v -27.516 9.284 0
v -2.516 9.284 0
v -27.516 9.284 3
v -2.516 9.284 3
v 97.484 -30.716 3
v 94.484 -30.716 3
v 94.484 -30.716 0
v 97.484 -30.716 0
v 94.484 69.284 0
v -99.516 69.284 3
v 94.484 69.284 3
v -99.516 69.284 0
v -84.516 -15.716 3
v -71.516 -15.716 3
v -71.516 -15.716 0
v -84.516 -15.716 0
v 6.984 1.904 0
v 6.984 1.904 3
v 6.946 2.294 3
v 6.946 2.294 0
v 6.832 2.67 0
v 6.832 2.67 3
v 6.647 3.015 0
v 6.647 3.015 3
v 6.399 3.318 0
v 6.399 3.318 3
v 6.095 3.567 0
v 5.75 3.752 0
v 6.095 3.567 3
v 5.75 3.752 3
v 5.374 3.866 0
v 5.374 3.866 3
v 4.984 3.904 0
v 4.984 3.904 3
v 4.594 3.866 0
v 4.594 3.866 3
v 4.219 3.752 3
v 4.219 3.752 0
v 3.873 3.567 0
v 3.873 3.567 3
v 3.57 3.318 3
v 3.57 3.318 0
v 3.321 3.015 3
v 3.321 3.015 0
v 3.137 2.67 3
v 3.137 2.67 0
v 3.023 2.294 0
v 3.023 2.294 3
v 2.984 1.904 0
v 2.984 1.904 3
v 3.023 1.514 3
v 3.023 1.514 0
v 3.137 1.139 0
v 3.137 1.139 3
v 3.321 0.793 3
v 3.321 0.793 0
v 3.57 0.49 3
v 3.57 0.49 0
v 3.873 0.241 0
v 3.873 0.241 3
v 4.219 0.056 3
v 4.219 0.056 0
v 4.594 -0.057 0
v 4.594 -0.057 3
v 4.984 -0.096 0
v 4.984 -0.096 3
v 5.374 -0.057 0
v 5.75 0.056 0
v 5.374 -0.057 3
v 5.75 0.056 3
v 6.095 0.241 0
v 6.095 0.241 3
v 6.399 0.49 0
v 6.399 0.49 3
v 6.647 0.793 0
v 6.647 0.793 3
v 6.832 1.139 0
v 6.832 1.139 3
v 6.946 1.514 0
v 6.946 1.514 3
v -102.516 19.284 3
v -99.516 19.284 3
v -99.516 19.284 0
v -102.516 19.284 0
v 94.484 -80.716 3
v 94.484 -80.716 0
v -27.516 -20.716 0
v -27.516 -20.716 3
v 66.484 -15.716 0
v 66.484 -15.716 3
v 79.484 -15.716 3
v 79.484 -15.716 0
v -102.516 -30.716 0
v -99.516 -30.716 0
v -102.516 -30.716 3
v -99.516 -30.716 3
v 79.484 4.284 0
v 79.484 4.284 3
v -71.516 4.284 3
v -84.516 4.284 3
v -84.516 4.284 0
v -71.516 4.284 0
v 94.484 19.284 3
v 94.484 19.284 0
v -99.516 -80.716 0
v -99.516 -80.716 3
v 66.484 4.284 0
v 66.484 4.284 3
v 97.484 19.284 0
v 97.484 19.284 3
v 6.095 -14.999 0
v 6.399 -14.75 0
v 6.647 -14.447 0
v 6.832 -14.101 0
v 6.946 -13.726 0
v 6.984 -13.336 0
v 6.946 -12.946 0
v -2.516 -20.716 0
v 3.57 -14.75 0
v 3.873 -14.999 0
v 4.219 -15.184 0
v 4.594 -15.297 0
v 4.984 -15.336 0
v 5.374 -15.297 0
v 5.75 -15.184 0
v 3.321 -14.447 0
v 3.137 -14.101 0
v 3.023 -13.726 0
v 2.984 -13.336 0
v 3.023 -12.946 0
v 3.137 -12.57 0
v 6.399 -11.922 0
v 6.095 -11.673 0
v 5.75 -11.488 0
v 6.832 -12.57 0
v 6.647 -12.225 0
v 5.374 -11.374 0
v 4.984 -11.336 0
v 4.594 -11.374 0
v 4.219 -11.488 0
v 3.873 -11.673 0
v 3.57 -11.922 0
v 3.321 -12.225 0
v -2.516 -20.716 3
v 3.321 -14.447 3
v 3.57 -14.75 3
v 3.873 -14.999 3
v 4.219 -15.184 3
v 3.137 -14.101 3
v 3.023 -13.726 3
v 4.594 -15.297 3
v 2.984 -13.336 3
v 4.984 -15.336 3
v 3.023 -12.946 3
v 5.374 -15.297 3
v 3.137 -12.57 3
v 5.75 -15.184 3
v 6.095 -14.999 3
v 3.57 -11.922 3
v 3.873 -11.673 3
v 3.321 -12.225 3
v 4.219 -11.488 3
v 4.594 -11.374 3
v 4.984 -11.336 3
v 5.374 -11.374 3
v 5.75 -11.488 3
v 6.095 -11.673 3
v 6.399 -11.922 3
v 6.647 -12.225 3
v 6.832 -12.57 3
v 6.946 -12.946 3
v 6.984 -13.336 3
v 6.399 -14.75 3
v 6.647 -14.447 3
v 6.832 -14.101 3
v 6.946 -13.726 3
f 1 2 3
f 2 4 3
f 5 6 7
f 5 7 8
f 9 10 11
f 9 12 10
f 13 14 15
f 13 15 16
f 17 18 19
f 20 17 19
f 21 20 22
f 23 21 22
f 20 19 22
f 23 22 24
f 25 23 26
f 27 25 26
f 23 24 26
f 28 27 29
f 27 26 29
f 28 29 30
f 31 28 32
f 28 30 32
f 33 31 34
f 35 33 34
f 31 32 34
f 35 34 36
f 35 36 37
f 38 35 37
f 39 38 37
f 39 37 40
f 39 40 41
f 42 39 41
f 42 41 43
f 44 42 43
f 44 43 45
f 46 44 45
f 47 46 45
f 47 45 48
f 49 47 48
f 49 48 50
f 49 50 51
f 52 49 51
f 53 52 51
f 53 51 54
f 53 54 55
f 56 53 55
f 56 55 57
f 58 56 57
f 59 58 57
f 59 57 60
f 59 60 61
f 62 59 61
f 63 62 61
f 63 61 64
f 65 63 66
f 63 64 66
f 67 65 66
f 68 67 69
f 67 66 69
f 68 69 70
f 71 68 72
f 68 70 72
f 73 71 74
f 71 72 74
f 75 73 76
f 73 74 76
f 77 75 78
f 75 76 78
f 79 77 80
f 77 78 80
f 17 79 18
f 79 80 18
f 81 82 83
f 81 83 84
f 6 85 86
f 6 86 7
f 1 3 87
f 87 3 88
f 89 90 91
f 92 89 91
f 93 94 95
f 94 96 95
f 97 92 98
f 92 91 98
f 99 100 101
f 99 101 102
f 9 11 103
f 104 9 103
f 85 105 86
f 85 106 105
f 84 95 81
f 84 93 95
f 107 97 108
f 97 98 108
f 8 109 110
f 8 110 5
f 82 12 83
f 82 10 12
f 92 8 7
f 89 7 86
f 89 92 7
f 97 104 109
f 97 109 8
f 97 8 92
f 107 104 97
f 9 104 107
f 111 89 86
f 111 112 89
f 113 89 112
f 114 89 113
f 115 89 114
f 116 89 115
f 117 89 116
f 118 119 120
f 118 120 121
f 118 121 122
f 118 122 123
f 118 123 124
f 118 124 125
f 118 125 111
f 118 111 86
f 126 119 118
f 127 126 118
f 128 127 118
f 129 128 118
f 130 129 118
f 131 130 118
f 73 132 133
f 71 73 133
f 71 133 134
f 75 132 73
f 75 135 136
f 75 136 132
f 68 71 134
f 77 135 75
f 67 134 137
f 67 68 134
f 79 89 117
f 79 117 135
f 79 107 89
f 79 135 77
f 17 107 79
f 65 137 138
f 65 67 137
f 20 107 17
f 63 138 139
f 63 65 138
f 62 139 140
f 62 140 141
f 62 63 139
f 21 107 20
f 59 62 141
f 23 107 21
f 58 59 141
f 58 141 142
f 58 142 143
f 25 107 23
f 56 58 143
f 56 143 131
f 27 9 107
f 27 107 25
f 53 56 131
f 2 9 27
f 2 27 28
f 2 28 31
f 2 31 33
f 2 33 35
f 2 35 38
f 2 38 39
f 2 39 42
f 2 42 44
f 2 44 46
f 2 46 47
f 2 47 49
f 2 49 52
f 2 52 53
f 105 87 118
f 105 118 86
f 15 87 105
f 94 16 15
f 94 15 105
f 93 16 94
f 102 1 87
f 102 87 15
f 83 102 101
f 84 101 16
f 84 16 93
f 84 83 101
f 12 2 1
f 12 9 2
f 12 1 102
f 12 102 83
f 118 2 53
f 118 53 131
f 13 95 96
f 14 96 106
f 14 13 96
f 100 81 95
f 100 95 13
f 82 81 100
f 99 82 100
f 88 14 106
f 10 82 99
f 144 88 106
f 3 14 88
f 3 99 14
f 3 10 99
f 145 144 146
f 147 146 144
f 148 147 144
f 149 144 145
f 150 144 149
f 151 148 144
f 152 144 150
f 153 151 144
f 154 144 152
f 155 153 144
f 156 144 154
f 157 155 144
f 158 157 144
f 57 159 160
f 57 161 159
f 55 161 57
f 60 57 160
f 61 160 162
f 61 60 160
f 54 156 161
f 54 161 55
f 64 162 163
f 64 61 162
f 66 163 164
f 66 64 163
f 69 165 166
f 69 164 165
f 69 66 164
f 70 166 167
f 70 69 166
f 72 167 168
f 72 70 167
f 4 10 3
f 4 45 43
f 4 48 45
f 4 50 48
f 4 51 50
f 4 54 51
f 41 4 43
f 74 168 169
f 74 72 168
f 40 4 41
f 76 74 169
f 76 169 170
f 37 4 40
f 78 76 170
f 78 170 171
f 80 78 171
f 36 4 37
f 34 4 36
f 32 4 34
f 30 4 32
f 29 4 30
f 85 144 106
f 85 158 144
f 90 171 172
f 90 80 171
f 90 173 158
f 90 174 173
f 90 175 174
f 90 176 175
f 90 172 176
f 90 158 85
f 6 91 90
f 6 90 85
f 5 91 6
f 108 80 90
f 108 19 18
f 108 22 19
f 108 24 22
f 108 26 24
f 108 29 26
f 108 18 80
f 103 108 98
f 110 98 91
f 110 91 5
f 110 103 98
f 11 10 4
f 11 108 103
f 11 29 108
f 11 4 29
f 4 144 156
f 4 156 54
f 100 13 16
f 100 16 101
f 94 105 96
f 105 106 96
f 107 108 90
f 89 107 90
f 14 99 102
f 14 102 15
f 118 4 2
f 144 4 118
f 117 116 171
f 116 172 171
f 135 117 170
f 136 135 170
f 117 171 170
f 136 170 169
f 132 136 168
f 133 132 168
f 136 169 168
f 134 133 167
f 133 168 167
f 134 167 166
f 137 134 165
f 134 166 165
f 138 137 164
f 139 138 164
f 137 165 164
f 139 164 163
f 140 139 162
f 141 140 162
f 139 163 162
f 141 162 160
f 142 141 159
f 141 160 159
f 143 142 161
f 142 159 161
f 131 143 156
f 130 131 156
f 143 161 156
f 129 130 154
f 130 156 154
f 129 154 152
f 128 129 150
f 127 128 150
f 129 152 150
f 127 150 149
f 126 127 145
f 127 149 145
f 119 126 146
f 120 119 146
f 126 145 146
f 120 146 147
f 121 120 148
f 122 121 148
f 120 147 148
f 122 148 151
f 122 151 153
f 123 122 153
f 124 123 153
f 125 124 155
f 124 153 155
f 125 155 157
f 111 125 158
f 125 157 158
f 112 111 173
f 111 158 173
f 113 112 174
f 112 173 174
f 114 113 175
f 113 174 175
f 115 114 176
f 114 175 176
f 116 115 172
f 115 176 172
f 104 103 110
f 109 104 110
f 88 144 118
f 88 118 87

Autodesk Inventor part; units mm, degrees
ref_plane "YZ Plane" through (0, 0, 0) normal (1, 0, 0) x (0, 1, 0)
ref_plane "XZ Plane" through (0, 0, 0) normal (0, 1, 0) x (-1, 0, 0)
ref_plane "XY Plane" through (0, 0, 0) normal (0, 0, 1) x (1, 0, 0)
sketch "Sketch1" plane through (0, 0, 0) normal (0, 0, 1) x (1, 0, 0)
  line L0 (-102.5157, 69.2842) -> (97.4843, 69.2842)
  line L1 (97.4843, 69.2842) -> (97.4843, -80.7158)
  line L2 (97.4843, -80.7158) -> (-102.5157, -80.7158)
  line L3 (-102.5157, -80.7158) -> (-102.5157, 69.2842)
  point P0 (0, 0)
extrude "Extrusion1" add sketch "Sketch1" along normal blind 3
sketch "Sketch3" plane through (0, 0, 3) normal (0, 0, 1) x (1, 0, 0)
  point P0 (0, 0)
sketch "Sketch4" plane through (0, 0, 3) normal (0, 0, 1) x (1, 0, 0)
  line L0 (97.4843, 69.2842) -> (-102.5157, 69.2842) projected
  line L1 (-102.5157, 69.2842) -> (-99.5157, 69.2842)
  line L2 (-99.5157, 69.2842) -> (-99.5157, 19.2842)
  line L3 (-99.5157, 19.2842) -> (-102.5157, 19.2842)
  line L4 (-102.5157, 19.2842) -> (-102.5157, 69.2842)
  point P0 (0, 0)
extrude "Extrusion2" cut sketch "Sketch4" against normal blind 3
sketch "Sketch5" plane through (0, 0, 3) normal (0, 0, 1) x (1, 0, 0)
  line L0 (97.4843, -80.7158) -> (94.4843, -80.7158)
  line L1 (94.4843, -80.7158) -> (94.4843, -30.7158)
  line L2 (94.4843, -30.7158) -> (97.4843, -30.7158)
  line L3 (97.4843, -30.7158) -> (97.4843, -80.7158)
  point P0 (0, 0)
  point P1 (-102.5157, -80.7158)
  dimension "d17" = 3
  dimension "d18" = 50
extrude "Extrusion3" cut sketch "Sketch5" against normal blind 3
sketch "Sketch6" plane through (0, 0, 3) normal (0, 0, 1) x (1, 0, 0)
  line L0 (97.4843, -30.7158) -> (97.4843, 69.2842) projected
  line L1 (97.4843, 69.2842) -> (94.4843, 69.2842)
  line L2 (94.4843, 69.2842) -> (94.4843, 19.2842)
  line L3 (94.4843, 19.2842) -> (97.4843, 19.2842)
  line L4 (97.4843, 19.2842) -> (97.4843, 69.2842)
  point P0 (0, 0)
  dimension "d21" = 50
  dimension "d22" = 3
extrude "Extrusion4" cut sketch "Sketch6" against normal blind 3
sketch "Sketch7" plane through (0, 0, 3) normal (0, 0, 1) x (1, 0, 0)
  line L0 (-102.5157, 19.2842) -> (-102.5157, -80.7158) projected
  line L1 (-102.5157, -80.7158) -> (-99.5157, -80.7158)
  line L2 (-99.5157, -80.7158) -> (-99.5157, -30.7158)
  line L3 (-99.5157, -30.7158) -> (-102.5157, -30.7158)
  line L4 (-102.5157, -30.7158) -> (-102.5157, -80.7158)
  point P0 (0, 0)
  dimension "d25" = 50
  dimension "d26" = 3
extrude "Extrusion5" cut sketch "Sketch7" against normal blind 3
sketch "Sketch8" plane through (0, 0, 3) normal (0, 0, 1) x (1, 0, 0)
  line L0 (-102.5157, -30.7158) -> (-102.5157, 19.2842) projected
  line L1 (97.4843, -30.7158) -> (94.4843, -30.7158) projected
  line L2 (94.4843, -80.7158) -> (-99.5157, -80.7158) projected
  line L3 (-10.0157, -50.7158) -> (4.9843, -50.7158)
  line L4 (4.9843, -50.7158) -> (4.9843, -80.7158)
  line L5 (4.9843, -80.7158) -> (-10.0157, -80.7158)
  line L6 (-10.0157, -80.7158) -> (-10.0157, -50.7158)
  point P0 (0, 0)
  dimension "d32" = 15
  dimension "d33" = 30
extrude "Extrusion6" cut sketch "Sketch8" against normal blind 3
sketch "Sketch9" plane through (-10.0157, -80.7158, 3) normal (1, 0, 0) x (0, 0, -1)
  point P0 (3, 80.7158)
sketch "Sketch10" plane through (-10.0157, -50.7158, 3) normal (0, -1, 0) x (1, 0, 0)
  line L0 (15, 0) -> (15, -3) projected
  line L1 (15, -3) -> (0, -3) projected
  line L2 (15, 0) -> (0, 0)
  line L3 (0, 0) -> (0, -3)
  line L4 (0, -3) -> (15, -3)
  line L5 (15, -3) -> (15, 0)
  point P0 (10.0157, -3)
extrude "Extrusion7" add sketch "Sketch10" along normal blind 30
sketch "Sketch11" plane through (0, 0, 3) normal (0, 0, 1) x (1, 0, 0)
  line L0 (-102.5157, 19.2842) -> (-99.5157, 19.2842) projected
  line L1 (-99.5157, 69.2842) -> (94.4843, 69.2842) projected
  line L2 (94.4843, -80.7158) -> (-99.5157, -80.7158) projected
  line L3 (-99.5157, 19.2842) -> (-99.5157, 69.2842) projected
  line L4 (-102.5157, -30.7158) -> (-102.5157, 19.2842) projected
  line L5 (-2.5157, 9.2842) -> (-27.5157, 9.2842)
  line L6 (-2.5157, 9.2842) -> (-2.5157, -20.7158)
  line L7 (-27.5157, 9.2842) -> (-27.5157, -20.7158)
  line L8 (-2.5157, -20.7158) -> (-27.5157, -20.7158)
  circle A0 centre (4.9843, 1.9042) radius 2
  circle A1 centre (4.9843, -13.3358) radius 2
  point P0 (0, 0)
extrude "Extrusion8" cut sketch "Sketch11" against normal blind 21.5
sketch "Sketch12" plane through (0, 0, 3) normal (0, 0, 1) x (1, 0, 0)
  point P0 (0, 0)
sketch "Sketch13" plane through (0, 0, 3) normal (0, 0, 1) x (1, 0, 0)
  point P0 (0, 0)
sketch "Sketch14" plane through (0, 0, 3) normal (0, 0, 1) x (1, 0, 0)
  line L0 (97.4843, 19.2842) -> (97.4843, -30.7158) projected
  line L1 (-2.5157, -20.7158) -> (-2.5157, 9.2842) projected
  line L2 (36.2282, 8.4721) -> (58.5282, 8.4721)
  line L3 (58.5282, 8.4721) -> (58.5282, -19.8279)
  line L4 (58.5282, -19.8279) -> (36.2282, -19.8279)
  line L5 (36.2282, -19.8279) -> (36.2282, 8.4721)
  line L6 (-99.5157, 69.2842) -> (94.4843, 69.2842) projected
  point P0 (0, 0)
extrude "Extrusion9" cut sketch "Sketch14" against normal blind 30
sketch "Sketch15" plane through (0, 0, 3) normal (0, 0, 1) x (1, 0, 0)
  line L0 (36.2282, -19.8279) -> (36.2282, 8.4721) projected
  line L1 (36.2282, -19.8279) -> (58.5282, -19.8279) projected
  line L2 (36.2282, 8.4721) -> (58.5282, 8.4721)
  line L3 (58.5282, 8.4721) -> (58.5282, -19.8279)
  line L4 (58.5282, -19.8279) -> (36.2282, -19.8279)
  line L5 (36.2282, -19.8279) -> (36.2282, 8.4721)
  point P0 (0, 0)
extrude "Extrusion10" add sketch "Sketch15" against normal blind 3
sketch "Sketch16" plane through (0, 0, 3) normal (0, 0, 1) x (1, 0, 0)
  line L0 (-102.5157, -30.7158) -> (-102.5157, 19.2842) projected
  line L1 (97.4843, 19.2842) -> (97.4843, -30.7158) projected
  line L2 (-99.5157, 69.2842) -> (94.4843, 69.2842) projected
  line L3 (40.9489, 4.2992) -> (53.9459, 4.2992)
  line L4 (53.9459, 4.2992) -> (53.9459, -15.7008)
  line L5 (53.9459, -15.7008) -> (40.9489, -15.7008)
  line L6 (40.9489, -15.7008) -> (40.9489, 4.2992)
  point P0 (0, 0)
extrude "Extrusion11" cut sketch "Sketch16" against normal blind 3
sketch "Sketch17" plane through (0, 0, 3) normal (0, 0, 1) x (1, 0, 0)
  line L0 (40.9489, -15.7008) -> (40.9489, 4.2992) projected
  line L1 (-102.5157, -30.7158) -> (-102.5157, 19.2842) projected
  line L2 (53.9459, -15.7008) -> (53.9459, 4.2992) projected
  line L3 (97.4843, 19.2842) -> (97.4843, -30.7158) projected
  line L4 (40.9489, 4.2992) -> (53.9459, 4.2992)
  line L5 (53.9459, 4.2992) -> (53.9459, -15.7008)
  line L6 (53.9459, -15.7008) -> (40.9489, -15.7008)
  line L7 (40.9489, -15.7008) -> (40.9489, 4.2992)
  point P0 (0, 0)
extrude "Extrusion12" add sketch "Sketch17" against normal blind 3
sketch "Sketch18" plane through (0, 0, 3) normal (0, 0, 1) x (1, 0, 0)
  line L0 (97.4843, 19.2842) -> (97.4843, -30.7158) projected
  line L1 (-102.5157, -30.7158) -> (-102.5157, 19.2842) projected
  line L2 (-84.5157, 4.2842) -> (-71.5157, 4.2842)
  line L3 (-84.5157, 4.2842) -> (-71.5157, 4.2842)
  line L4 (-71.5157, 4.2842) -> (-71.5157, -15.7158)
  line L5 (-71.5157, -15.7158) -> (-84.5157, -15.7158)
  line L6 (-84.5157, -15.7158) -> (-84.5157, 4.2842)
  line L7 (79.4843, 4.2842) -> (66.4843, 4.2842)
  line L8 (79.4843, 4.2842) -> (66.4843, 4.2842)
  line L9 (66.4843, 4.2842) -> (66.4843, -15.7158)
  line L10 (66.4843, -15.7158) -> (79.4843, -15.7158)
  line L11 (79.4843, -15.7158) -> (79.4843, 4.2842)
  point P0 (0, 0)
extrude "Extrusion13" cut sketch "Sketch18" against normal blind 3
sketch "Sketch19" plane through (0, 0, 3) normal (0, 0, 1) x (1, 0, 0)
  point P0 (0, 0)
sketch "Sketch20" plane through (0, 0, 3) normal (0, 0, 1) x (1, 0, 0)
  line L0 (-84.5157, 4.2842) -> (-84.5157, -15.7158) projected
  line L1 (-71.5157, -15.7158) -> (-71.5157, 4.2842) projected
  line L2 (-84.5157, 4.2842) -> (-71.5157, 4.2842)
  line L3 (-71.5157, 4.2842) -> (-71.5157, -15.7158)
  line L4 (-71.5157, -15.7158) -> (-84.5157, -15.7158)
  line L5 (-84.5157, -15.7158) -> (-84.5157, 4.2842)
  point P0 (0, 0)
  dimension "d102" = 13
  dimension "d103" = 20
properties part number "Level1"
